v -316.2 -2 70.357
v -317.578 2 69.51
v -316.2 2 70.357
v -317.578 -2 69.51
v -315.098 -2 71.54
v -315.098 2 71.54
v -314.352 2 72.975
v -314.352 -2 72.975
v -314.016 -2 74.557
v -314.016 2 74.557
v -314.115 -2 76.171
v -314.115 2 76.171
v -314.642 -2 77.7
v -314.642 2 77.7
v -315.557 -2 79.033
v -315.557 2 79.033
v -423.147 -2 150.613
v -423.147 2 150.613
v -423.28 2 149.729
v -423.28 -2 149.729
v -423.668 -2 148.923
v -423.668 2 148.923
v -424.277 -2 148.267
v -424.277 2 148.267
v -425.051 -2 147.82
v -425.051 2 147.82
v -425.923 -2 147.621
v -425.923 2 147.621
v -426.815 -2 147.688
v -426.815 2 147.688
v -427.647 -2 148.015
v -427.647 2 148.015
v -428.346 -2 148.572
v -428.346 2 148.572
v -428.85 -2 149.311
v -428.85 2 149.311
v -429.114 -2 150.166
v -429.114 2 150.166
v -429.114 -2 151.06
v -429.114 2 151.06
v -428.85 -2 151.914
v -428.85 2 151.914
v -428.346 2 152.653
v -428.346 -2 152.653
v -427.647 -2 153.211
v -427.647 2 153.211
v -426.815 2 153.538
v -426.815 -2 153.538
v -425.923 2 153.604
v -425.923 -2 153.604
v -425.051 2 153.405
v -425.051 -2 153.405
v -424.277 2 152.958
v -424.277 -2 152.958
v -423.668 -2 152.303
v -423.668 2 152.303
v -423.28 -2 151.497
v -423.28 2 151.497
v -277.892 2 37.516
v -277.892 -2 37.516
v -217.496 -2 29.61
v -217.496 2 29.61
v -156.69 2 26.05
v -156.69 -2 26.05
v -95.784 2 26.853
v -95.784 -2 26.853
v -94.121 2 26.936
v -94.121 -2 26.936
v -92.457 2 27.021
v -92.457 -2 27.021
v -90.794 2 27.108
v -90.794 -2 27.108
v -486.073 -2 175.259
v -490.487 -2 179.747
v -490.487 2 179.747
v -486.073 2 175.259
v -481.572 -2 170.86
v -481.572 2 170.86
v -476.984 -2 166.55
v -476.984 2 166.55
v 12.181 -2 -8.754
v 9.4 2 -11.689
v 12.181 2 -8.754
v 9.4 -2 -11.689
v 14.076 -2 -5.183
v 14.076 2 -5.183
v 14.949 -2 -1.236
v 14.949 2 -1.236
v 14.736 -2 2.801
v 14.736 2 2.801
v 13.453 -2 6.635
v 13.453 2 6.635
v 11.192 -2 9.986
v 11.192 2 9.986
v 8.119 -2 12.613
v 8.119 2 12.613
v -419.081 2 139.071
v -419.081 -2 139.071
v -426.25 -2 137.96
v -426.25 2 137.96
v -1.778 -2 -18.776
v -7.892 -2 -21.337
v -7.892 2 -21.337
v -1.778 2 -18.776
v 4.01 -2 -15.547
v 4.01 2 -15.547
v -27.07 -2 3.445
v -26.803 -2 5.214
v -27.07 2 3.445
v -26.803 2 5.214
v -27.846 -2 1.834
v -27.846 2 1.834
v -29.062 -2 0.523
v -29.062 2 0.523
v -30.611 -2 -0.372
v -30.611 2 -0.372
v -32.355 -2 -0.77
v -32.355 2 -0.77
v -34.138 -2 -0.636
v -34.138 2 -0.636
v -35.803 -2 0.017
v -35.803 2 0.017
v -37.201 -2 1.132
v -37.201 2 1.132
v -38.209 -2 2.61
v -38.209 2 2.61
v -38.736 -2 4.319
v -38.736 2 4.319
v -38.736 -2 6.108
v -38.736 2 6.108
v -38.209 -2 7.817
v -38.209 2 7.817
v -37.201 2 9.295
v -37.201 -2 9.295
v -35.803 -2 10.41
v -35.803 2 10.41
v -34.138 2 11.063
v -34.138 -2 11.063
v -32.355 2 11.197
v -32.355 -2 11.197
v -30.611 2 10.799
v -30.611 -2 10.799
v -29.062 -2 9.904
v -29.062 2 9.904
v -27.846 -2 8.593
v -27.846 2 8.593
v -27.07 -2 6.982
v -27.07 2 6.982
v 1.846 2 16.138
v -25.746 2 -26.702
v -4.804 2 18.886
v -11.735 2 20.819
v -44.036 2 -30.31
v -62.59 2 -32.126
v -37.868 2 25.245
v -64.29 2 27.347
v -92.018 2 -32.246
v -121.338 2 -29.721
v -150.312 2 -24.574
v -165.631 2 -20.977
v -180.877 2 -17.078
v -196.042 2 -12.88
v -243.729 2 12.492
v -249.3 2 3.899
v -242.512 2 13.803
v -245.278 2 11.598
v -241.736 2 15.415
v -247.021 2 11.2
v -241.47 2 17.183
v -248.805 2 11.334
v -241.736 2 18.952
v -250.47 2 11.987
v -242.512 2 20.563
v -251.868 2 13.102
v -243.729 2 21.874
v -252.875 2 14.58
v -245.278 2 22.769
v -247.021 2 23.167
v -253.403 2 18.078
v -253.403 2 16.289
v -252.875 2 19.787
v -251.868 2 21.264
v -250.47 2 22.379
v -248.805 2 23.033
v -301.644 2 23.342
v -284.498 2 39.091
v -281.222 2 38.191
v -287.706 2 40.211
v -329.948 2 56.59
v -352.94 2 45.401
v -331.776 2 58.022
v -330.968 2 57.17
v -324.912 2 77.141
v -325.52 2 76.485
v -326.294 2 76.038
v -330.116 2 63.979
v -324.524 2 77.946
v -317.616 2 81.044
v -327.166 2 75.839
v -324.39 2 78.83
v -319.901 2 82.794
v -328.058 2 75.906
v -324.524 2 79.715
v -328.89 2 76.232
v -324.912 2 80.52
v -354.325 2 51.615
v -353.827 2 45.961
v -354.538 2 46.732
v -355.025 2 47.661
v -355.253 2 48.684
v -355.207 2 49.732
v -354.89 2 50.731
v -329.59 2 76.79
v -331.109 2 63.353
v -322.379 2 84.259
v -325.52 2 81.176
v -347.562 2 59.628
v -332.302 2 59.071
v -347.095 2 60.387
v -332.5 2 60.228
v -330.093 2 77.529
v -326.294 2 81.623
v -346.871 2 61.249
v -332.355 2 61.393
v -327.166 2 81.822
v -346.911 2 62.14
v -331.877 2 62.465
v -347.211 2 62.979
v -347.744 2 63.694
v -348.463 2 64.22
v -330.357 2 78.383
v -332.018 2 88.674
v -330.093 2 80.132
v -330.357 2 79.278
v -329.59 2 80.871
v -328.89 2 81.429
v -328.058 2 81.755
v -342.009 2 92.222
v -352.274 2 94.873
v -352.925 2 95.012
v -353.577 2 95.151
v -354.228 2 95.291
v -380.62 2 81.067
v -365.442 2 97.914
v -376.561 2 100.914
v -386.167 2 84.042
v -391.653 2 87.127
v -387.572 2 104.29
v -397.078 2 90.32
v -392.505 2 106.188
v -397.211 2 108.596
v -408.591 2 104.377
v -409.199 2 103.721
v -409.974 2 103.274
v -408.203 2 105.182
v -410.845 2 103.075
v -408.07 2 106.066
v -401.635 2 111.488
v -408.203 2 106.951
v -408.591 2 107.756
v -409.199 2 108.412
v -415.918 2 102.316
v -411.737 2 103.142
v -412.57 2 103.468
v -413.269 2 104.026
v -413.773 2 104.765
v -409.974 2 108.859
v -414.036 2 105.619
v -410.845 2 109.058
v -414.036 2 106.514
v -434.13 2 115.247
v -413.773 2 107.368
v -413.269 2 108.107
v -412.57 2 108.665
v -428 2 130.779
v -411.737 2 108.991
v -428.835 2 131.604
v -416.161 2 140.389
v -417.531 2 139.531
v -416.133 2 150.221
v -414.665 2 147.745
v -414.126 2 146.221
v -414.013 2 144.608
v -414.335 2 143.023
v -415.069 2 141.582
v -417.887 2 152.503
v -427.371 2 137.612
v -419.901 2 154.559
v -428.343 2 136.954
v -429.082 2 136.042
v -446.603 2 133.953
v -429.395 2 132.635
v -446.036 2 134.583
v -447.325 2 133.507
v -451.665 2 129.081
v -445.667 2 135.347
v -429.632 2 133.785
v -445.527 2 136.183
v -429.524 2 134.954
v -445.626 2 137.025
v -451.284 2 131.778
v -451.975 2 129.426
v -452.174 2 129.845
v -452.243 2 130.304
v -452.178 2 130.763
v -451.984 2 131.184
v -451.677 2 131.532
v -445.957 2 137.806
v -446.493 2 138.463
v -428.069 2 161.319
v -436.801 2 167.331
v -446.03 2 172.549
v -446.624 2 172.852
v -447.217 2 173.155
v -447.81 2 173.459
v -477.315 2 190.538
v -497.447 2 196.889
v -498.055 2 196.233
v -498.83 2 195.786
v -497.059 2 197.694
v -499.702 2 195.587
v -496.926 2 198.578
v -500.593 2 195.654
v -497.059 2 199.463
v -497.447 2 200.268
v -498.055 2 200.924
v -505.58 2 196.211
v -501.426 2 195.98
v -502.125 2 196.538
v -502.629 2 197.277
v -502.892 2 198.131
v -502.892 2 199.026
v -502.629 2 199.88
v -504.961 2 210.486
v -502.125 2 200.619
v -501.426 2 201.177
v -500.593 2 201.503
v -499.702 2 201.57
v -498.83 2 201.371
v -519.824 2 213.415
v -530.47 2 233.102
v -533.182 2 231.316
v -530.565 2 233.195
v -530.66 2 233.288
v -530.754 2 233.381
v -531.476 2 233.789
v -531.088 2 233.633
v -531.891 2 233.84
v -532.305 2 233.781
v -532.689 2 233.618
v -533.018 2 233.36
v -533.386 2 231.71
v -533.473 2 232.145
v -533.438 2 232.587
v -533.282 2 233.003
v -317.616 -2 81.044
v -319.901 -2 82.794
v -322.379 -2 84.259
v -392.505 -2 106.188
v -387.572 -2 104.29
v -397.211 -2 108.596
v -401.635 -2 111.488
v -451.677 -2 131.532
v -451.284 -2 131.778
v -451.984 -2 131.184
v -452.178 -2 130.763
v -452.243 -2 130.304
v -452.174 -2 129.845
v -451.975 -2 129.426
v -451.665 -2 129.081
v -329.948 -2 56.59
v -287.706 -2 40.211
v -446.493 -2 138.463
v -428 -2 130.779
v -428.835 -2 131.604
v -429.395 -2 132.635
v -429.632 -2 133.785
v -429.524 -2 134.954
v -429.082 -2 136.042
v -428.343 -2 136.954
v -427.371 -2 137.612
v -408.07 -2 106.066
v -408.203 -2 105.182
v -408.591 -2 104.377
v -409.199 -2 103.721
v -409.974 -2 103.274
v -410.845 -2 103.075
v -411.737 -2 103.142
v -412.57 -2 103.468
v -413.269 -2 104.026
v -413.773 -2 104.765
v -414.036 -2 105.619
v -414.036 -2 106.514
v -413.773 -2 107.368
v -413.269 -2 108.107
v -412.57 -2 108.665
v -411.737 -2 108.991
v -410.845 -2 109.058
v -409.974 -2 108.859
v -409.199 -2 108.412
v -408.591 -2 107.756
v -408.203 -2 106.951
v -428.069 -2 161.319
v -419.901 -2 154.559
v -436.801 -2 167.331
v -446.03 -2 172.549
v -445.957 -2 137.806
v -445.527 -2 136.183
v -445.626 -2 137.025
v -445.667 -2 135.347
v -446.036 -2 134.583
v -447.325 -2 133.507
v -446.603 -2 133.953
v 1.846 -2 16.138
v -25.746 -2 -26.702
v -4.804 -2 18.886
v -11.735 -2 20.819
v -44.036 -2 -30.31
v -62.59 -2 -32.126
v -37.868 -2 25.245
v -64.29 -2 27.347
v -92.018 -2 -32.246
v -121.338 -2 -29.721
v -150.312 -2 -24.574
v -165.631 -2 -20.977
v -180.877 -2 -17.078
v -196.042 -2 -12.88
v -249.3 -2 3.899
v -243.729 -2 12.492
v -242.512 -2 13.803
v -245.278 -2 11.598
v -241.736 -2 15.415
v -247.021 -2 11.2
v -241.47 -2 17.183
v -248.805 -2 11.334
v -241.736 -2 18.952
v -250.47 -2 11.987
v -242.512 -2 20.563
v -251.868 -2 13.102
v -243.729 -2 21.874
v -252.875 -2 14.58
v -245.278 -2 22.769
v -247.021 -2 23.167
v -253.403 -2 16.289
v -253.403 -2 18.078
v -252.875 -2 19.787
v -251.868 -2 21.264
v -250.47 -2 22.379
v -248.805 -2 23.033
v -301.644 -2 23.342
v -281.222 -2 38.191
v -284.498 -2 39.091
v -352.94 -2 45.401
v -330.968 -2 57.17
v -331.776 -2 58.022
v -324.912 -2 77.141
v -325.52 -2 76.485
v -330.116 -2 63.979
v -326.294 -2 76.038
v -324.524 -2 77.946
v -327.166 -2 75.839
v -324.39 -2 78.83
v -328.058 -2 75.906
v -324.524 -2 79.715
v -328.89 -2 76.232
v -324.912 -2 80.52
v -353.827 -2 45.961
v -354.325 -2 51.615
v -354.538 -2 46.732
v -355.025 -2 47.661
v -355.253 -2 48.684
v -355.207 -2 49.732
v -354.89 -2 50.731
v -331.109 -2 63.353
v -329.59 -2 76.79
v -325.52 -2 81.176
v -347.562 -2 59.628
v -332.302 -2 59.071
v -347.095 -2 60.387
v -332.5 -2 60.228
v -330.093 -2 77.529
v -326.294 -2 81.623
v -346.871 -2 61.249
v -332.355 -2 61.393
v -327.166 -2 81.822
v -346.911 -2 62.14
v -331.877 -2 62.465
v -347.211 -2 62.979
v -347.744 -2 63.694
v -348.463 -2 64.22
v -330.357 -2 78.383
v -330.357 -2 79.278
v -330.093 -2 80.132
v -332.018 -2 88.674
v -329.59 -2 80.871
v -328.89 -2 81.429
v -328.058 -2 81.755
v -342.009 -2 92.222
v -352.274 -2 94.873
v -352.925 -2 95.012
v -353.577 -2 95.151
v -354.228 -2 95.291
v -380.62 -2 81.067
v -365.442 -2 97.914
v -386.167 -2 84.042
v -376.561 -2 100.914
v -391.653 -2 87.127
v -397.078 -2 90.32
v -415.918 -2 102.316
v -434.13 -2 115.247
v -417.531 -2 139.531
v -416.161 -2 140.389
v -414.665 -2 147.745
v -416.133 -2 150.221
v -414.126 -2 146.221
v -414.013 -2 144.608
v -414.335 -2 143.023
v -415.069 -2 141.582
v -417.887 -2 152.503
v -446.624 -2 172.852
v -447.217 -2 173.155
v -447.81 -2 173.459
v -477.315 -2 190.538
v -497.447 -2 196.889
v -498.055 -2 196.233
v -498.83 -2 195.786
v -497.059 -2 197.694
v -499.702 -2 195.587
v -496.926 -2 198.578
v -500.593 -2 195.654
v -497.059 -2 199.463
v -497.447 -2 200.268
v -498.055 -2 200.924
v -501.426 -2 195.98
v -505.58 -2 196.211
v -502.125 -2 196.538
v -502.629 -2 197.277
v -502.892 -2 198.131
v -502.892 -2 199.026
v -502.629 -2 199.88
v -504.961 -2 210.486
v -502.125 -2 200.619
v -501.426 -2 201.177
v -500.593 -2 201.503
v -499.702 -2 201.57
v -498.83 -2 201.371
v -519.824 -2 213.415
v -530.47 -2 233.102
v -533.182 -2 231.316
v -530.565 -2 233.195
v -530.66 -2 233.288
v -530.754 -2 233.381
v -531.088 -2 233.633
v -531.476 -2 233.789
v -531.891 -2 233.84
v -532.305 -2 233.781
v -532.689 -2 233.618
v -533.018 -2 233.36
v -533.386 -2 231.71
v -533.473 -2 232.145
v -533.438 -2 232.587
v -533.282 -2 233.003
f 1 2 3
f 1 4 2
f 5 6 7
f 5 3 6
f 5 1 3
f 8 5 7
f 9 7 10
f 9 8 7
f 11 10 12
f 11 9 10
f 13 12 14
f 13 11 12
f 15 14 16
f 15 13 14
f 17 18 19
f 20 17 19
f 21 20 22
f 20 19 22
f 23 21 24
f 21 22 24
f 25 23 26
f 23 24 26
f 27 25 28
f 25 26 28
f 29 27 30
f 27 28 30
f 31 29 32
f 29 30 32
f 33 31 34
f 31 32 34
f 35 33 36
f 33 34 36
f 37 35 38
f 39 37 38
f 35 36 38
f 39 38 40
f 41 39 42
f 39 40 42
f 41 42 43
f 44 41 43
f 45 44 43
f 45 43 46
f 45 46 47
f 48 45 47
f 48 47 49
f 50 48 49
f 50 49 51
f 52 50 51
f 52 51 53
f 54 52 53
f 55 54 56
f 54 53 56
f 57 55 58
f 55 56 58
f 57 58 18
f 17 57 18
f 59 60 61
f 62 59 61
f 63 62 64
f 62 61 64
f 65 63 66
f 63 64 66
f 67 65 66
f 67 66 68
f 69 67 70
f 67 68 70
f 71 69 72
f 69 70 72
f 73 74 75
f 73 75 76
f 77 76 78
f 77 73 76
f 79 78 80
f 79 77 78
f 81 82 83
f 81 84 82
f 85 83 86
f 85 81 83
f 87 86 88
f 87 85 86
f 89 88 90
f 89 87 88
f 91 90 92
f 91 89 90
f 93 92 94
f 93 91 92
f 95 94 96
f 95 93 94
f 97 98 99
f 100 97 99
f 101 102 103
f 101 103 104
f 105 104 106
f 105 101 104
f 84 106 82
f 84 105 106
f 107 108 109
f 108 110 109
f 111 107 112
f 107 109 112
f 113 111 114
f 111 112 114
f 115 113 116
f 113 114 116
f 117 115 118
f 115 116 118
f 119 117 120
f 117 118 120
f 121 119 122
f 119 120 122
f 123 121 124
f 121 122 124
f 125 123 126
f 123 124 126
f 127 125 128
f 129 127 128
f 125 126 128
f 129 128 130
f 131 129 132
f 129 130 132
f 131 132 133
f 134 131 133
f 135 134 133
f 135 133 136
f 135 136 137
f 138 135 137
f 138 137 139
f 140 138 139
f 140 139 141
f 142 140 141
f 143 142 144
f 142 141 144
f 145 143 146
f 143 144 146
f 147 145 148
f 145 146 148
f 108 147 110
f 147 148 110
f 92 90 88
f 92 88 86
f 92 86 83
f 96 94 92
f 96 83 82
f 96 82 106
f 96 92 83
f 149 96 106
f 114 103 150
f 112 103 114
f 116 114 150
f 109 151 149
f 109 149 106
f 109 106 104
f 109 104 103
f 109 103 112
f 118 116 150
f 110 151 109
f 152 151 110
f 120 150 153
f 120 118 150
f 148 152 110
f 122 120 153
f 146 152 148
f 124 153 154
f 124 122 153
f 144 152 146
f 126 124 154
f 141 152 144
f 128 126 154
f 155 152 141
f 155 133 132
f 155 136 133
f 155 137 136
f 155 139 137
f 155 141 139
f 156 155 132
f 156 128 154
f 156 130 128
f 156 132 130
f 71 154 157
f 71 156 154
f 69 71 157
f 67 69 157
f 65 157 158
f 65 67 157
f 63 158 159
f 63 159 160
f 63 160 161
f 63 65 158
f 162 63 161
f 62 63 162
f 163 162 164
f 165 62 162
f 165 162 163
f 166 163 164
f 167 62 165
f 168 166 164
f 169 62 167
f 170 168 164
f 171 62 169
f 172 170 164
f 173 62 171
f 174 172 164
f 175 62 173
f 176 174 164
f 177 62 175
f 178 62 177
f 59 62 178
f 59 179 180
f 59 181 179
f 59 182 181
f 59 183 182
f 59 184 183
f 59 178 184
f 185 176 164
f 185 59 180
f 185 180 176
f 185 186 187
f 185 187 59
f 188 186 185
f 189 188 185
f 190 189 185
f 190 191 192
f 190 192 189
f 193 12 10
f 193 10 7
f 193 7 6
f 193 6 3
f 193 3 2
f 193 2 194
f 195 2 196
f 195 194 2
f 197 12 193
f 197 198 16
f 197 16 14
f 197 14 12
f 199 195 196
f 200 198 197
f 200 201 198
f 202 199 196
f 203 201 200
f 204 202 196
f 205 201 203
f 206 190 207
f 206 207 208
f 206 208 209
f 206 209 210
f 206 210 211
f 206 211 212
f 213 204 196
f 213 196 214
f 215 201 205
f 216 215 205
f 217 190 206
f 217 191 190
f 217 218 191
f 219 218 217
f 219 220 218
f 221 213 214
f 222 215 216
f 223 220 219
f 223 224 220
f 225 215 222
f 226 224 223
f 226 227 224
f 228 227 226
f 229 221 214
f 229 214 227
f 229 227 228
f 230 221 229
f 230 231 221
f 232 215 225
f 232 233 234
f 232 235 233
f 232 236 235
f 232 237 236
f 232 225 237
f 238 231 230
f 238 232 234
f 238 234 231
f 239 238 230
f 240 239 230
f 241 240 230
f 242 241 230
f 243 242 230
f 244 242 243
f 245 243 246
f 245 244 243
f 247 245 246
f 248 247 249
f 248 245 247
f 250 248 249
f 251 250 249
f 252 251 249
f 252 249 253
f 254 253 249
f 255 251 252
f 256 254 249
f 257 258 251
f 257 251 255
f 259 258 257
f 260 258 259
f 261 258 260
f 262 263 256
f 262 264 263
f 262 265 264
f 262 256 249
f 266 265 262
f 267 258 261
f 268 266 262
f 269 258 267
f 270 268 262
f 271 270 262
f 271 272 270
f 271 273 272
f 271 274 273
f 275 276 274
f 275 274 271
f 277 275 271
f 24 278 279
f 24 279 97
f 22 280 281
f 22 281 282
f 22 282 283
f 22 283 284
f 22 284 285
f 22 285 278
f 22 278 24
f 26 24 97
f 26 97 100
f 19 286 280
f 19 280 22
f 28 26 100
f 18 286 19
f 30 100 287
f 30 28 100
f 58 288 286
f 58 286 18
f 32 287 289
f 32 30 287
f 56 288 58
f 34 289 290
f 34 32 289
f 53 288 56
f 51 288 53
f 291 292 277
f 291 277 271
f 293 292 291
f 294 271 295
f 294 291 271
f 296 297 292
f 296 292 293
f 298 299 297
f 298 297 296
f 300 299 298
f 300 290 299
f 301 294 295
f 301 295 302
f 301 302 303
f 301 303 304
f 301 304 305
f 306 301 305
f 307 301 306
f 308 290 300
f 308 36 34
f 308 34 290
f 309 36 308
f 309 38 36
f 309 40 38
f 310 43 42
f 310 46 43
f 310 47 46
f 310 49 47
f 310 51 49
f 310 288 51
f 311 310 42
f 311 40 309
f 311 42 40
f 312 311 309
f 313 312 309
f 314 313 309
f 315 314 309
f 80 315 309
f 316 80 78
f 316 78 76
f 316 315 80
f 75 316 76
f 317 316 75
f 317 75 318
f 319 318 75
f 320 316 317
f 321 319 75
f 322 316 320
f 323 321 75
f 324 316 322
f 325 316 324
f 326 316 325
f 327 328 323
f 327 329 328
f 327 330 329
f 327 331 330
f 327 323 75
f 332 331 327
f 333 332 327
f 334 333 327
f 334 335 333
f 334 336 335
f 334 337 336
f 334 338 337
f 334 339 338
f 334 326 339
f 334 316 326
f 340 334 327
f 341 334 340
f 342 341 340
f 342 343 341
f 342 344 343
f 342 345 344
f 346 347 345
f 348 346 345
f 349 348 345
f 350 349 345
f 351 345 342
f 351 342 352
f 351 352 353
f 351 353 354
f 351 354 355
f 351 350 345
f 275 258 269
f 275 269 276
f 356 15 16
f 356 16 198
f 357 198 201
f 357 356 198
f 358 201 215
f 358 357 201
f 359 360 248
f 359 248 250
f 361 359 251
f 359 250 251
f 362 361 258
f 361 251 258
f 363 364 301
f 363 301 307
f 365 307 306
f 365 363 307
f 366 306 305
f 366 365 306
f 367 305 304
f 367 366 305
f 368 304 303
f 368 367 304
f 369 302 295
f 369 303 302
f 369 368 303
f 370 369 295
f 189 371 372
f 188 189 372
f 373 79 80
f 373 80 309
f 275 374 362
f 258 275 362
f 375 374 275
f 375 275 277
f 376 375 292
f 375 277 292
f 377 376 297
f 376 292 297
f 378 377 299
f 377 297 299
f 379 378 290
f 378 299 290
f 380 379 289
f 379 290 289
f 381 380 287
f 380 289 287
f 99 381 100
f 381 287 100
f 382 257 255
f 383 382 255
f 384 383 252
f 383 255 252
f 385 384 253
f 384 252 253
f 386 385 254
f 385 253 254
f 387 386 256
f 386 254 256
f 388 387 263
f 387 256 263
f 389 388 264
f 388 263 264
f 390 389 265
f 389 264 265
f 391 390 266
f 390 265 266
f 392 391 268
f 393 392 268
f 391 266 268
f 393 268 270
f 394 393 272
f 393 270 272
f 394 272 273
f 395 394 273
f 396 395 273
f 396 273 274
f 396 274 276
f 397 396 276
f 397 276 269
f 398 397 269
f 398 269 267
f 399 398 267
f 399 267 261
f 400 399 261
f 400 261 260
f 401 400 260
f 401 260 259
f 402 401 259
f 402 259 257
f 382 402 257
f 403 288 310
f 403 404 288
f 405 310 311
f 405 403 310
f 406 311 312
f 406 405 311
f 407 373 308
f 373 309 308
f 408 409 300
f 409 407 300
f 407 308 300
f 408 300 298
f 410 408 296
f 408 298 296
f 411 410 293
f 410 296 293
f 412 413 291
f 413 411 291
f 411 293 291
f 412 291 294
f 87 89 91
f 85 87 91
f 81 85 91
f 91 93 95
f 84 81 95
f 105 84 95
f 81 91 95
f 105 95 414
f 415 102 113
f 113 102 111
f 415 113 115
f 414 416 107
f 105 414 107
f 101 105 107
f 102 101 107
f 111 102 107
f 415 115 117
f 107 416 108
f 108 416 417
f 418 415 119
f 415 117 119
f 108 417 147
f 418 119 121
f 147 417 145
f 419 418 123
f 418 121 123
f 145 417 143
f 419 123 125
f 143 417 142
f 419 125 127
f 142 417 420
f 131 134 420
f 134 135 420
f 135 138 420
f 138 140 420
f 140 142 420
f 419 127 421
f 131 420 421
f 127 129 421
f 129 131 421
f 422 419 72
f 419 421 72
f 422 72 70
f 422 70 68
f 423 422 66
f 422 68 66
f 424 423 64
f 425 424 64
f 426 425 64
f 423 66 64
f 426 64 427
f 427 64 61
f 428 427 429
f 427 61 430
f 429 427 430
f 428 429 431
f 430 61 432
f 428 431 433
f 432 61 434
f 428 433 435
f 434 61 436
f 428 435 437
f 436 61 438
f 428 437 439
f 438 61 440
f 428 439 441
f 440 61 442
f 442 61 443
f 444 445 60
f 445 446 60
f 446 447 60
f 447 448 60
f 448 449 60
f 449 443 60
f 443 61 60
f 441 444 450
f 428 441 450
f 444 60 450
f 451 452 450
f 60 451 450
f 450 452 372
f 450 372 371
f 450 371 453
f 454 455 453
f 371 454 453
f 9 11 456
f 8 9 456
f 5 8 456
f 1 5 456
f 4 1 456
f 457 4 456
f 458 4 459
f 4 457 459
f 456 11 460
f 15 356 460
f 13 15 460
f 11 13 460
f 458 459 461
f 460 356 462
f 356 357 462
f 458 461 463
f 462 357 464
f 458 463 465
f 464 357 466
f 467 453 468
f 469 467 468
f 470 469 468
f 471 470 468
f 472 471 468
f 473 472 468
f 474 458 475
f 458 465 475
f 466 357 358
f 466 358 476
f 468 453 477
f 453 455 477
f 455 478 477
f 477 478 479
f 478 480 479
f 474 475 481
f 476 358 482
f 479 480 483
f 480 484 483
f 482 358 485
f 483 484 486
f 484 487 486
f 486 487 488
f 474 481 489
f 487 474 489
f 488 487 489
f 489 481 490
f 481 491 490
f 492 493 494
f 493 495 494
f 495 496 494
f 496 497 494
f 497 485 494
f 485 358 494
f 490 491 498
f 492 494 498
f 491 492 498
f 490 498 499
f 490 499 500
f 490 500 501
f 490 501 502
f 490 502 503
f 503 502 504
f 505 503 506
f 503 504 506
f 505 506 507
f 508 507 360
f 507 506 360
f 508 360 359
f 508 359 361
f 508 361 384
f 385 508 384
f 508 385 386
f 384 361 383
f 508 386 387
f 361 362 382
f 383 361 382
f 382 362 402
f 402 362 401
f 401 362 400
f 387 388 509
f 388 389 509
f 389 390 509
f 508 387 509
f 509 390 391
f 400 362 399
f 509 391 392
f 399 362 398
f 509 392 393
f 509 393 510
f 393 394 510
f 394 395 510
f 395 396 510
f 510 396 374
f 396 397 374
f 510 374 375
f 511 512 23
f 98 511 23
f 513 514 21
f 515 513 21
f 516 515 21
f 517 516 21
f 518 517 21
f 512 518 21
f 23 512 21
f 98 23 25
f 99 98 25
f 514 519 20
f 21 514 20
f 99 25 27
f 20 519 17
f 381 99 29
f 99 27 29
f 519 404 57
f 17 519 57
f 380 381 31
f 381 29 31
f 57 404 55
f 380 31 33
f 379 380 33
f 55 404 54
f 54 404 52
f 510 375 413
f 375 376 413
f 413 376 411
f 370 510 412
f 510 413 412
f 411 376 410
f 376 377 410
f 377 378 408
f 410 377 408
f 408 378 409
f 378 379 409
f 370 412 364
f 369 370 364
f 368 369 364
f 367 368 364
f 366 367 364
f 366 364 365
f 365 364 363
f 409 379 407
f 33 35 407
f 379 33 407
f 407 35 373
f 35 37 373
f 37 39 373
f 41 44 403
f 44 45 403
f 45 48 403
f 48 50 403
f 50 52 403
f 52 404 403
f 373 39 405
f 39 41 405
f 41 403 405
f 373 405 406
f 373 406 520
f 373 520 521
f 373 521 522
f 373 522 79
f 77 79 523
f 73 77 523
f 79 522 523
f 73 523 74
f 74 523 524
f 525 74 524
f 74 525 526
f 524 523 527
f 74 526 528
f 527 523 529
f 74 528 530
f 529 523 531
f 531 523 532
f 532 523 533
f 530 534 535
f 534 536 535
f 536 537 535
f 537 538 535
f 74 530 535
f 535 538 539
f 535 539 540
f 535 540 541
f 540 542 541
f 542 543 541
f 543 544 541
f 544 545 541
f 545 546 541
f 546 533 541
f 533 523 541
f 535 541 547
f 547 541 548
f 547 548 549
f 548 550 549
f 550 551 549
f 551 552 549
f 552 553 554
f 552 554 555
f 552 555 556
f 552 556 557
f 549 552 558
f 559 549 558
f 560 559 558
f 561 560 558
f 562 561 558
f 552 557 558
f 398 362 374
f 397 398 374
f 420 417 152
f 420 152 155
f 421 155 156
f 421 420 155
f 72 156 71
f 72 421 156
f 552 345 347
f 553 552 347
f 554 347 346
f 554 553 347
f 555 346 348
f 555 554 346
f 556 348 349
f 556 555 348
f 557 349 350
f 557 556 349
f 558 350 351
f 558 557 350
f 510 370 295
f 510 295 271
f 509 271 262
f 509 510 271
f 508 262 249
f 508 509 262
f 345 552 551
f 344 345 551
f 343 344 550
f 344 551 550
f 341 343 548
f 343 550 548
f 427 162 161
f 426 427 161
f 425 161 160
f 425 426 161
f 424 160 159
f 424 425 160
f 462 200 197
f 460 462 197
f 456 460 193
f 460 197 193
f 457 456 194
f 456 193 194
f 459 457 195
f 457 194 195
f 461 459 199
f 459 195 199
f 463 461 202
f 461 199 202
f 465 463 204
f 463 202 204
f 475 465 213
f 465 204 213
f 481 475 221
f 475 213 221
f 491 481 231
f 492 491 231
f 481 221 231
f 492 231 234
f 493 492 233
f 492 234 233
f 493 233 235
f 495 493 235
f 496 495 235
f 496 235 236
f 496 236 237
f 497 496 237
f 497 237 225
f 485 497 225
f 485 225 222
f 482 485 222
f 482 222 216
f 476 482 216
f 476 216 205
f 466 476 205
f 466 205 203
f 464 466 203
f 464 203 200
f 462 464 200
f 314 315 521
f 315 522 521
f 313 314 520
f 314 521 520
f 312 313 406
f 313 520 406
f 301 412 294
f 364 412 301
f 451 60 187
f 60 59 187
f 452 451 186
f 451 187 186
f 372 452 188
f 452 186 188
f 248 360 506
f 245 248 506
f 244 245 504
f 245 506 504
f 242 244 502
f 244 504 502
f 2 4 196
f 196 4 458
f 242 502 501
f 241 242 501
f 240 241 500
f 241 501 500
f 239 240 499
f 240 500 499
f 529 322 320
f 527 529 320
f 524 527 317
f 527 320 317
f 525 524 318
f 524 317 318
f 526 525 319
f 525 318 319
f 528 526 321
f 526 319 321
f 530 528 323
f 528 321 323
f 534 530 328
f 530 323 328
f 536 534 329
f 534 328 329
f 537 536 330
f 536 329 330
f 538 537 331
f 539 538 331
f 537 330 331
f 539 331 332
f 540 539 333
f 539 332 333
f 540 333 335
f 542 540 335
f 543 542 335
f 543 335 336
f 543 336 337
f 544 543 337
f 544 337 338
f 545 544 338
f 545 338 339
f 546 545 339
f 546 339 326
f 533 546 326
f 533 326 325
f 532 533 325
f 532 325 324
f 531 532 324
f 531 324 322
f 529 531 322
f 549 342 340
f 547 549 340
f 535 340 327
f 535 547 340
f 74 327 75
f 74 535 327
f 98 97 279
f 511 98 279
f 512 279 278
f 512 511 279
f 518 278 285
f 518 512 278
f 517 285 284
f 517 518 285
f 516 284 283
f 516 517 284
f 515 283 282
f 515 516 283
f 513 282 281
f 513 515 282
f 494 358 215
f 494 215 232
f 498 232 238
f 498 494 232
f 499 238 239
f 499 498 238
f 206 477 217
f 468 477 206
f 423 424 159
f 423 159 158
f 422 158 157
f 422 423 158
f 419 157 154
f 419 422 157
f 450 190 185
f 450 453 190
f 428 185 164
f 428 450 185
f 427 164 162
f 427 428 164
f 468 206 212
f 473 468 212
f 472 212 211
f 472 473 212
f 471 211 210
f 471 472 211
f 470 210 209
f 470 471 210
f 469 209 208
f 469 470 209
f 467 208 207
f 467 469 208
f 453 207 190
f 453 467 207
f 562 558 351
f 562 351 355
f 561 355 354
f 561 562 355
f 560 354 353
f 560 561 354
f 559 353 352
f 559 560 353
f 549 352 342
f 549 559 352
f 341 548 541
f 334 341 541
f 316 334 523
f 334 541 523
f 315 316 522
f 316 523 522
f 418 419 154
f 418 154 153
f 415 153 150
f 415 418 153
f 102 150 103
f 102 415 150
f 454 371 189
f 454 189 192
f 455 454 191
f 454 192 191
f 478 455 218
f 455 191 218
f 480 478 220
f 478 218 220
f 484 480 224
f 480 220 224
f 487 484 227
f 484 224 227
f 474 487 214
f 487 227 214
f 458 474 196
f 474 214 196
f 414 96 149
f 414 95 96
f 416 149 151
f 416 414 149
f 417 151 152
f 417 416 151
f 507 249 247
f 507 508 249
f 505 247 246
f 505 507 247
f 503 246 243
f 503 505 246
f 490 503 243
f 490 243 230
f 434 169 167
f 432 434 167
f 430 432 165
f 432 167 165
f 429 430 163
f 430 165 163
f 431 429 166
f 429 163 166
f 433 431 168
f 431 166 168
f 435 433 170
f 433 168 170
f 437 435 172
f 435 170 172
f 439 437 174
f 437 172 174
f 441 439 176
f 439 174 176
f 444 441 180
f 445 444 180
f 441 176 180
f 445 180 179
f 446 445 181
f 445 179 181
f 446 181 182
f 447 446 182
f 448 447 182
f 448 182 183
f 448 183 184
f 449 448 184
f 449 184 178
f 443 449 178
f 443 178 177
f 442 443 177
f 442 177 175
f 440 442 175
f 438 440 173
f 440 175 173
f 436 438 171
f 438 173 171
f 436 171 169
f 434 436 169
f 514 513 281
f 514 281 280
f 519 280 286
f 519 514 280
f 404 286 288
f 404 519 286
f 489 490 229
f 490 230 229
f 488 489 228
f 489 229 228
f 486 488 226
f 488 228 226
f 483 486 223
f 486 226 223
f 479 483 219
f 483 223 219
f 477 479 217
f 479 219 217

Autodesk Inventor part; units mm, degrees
ref_plane "YZ Plane" through (0, 0, 0) normal (1, 0, 0) x (0, 1, 0)
ref_plane "XZ Plane" through (0, 0, 0) normal (0, 1, 0) x (-1, 0, 0)
ref_plane "XY Plane" through (0, 0, 0) normal (0, 0, 1) x (1, 0, 0)
sketch "スケッチ1" plane through (0, 0, 0) normal (0, 1, 0) x (-1, 0, 0)
  arc A0 (352.9404, 45.4012) -> (350.2664, 52.9074) centre (351.268, 49.0348) ccw projected
  arc A1 (196.042, -12.8796) -> (352.9404, 45.4012) centre (-109.7603, 1050.7077) ccw projected
  arc A2 (150.312, -24.5744) -> (196.042, -12.8796) centre (-24.3171, 753.5344) ccw projected
  arc A3 (62.5903, -32.1265) -> (150.312, -24.5744) centre (78.6271, 294.8376) ccw projected
  arc A4 (7.8921, -21.3368) -> (62.5903, -32.1265) centre (71.9931, 159.5809) ccw projected
  arc A5 (-9.4003, -11.6891) -> (7.8921, -21.3368) centre (27.6212, 34.3463) ccw projected
  arc A6 (-8.119, 12.6128) -> (-9.4003, -11.6891) centre (0, 0) ccw projected
  arc A7 (11.7348, 20.8189) -> (-8.119, 12.6128) centre (24.3569, -37.8384) ccw projected
  arc A8 (90.7942, 27.108) -> (11.7348, 20.8189) centre (74.8452, -272.4677) ccw projected
  arc A9 (90.7942, 27.108) -> (95.7842, 26.8528) centre (154.5899, 1225.411) ccw projected
  arc A10 (95.7842, 26.8528) -> (350.2664, 52.9074) centre (137.4382, 875.8316) ccw projected
  arc A11 (451.6654, 129.0808) -> (449.8552, 131.7041) centre (450.6431, 130.3115) ccw projected
  arc A12 (397.0782, 90.3195) -> (451.6654, 129.0808) centre (168.8146, 469.5991) ccw projected
  arc A13 (380.6202, 81.0666) -> (397.0782, 90.3195) centre (232.593, 363.6259) ccw projected
  arc A14 (347.509, 69.0671) -> (380.6202, 81.0666) centre (319.8553, 197.0566) ccw projected
  arc A15 (325.2582, 67.5731) -> (347.509, 69.0671) centre (331.295, 144.1106) ccw projected
  arc A16 (317.5781, 69.5105) -> (325.2582, 67.5731) centre (327.1162, 91.13) ccw projected
  arc A17 (315.5573, 79.0327) -> (317.5781, 69.5105) centre (320, 75) ccw projected
  arc A18 (322.3786, 84.2587) -> (315.5573, 79.0327) centre (333.3281, 62.902) ccw projected
  arc A19 (352.2737, 94.8734) -> (322.3786, 84.2587) centre (377.1259, -22.5249) ccw projected
  arc A20 (352.2737, 94.8734) -> (354.2282, 95.2914) centre (252.865, 564.4668) ccw projected
  arc A21 (354.2282, 95.2914) -> (449.8552, 131.7041) centre (282.4293, 427.624) ccw projected
  arc A22 (533.1819, 231.3155) -> (533.0183, 233.3599) centre (531.8758, 232.2398) ccw projected
  arc A23 (490.4869, 179.7468) -> (533.1819, 231.3155) centre (171.8364, 487.0238) ccw projected
  arc A24 (476.9845, 166.5496) -> (490.4869, 179.7468) centre (260.8694, 401.1686) ccw projected
  arc A25 (448.1072, 146.3891) -> (476.9845, 166.5496) centre (388.2697, 262.8602) ccw projected
  arc A26 (427.0013, 139.1871) -> (448.1072, 146.3891) centre (413.023, 214.679) ccw projected
  arc A27 (419.0814, 139.0707) -> (427.0013, 139.1871) centre (422.699, 162.4222) ccw projected
  arc A28 (414.665, 147.7454) -> (419.0814, 139.0707) centre (420, 145) ccw projected
  arc A29 (419.9012, 154.5588) -> (414.665, 147.7454) centre (436.0051, 136.7638) ccw projected
  arc A30 (446.0304, 172.5493) -> (419.9012, 154.5588) centre (500.4207, 65.5835) ccw projected
  arc A31 (446.0304, 172.5493) -> (447.8101, 173.4589) centre (228.4693, 600.4128) ccw projected
  arc A32 (447.8101, 173.4589) -> (530.4702, 233.1021) centre (292.4437, 475.8846) ccw projected
  line L0 (530.4702, 233.1021) -> (525.5697, 238.1005) projected
  line L1 (525.5697, 238.1005) -> (526.9978, 239.5007) projected
  line L2 (526.9978, 239.5007) -> (533.0183, 233.3599) projected
  arc A33 (530.4702, 233.1021) -> (530.7544, 233.381) centre (292.4437, 475.8846) ccw
  arc A34 (533.0183, 233.3599) -> (530.7544, 233.381) centre (531.8758, 232.2398) ccw
  line L3 (317.5781, 69.5105) -> (338.9513, 60.0811)
  line L4 (338.9513, 60.0811) -> (283.0095, 38.3896)
  line L5 (380.6202, 81.0666) -> (345.1511, 62.485)
  line L6 (345.1511, 62.485) -> (354.3249, 51.6146)
  line L7 (419.0814, 139.0707) -> (435.7934, 136.4817)
  line L8 (435.7934, 136.4817) -> (395.4422, 106.9558)
  line L9 (476.9845, 166.5496) -> (443.1114, 135.348)
  line L10 (443.1114, 135.348) -> (451.2836, 131.7777)
  point P0 (0, 0)
  dimension "d2" = 45
  dimension "d3" = 45
  dimension "d4" = 60
  dimension "d5" = 50
extrude "押し出し1" add sketch "スケッチ1" along normal mid plane 4 contours A1 A2 A3 A4 A5 A6 A7 A8 A9 A10 A0 | A0 A10 L4 L3 A16 A15 A14 L5 L6 | A14 A15 A16 A17 A18 A19 A20 A21 A11 A12 A13 | A11 A21 L8 L7 A27 A26 A25 L9 L10 | A25 A26 A27 A28 A29 A30 A31 A32 A33 A34 A22 A23 A24
fillet "フィレット1" radius 4 2 edges at (-338.9513, 0, 60.0811) (-435.7934, 0, 136.4817)
fillet "フィレット1" radius 3 2 edges at (-443.1114, 0, 135.348) (-345.1511, 0, 62.485)
fillet "フィレット1" radius 50 2 edges at (-395.4422, 0, 106.9558) (-283.0095, 0, 38.3896)
sketch "スケッチ2" plane through (0, 2, 0) normal (0, 1, 0) x (1, 0, 0)
  circle A0 centre (-32.803, -5.2135) radius 6 projected
  circle A1 centre (-247.4696, -17.1833) radius 6 projected
  circle A2 centre (-327.3904, -78.8305) radius 3 projected
  circle A3 centre (-411.0696, -106.0665) radius 3 projected
  circle A4 centre (-426.1472, -150.6128) radius 3 projected
  circle A5 centre (-499.9259, -198.5785) radius 3 projected
  point P0 (0, 0)
extrude "押し出し2" cut sketch "スケッチ2" against normal through all
properties part number "bracket" material "木材 (オーク)"
